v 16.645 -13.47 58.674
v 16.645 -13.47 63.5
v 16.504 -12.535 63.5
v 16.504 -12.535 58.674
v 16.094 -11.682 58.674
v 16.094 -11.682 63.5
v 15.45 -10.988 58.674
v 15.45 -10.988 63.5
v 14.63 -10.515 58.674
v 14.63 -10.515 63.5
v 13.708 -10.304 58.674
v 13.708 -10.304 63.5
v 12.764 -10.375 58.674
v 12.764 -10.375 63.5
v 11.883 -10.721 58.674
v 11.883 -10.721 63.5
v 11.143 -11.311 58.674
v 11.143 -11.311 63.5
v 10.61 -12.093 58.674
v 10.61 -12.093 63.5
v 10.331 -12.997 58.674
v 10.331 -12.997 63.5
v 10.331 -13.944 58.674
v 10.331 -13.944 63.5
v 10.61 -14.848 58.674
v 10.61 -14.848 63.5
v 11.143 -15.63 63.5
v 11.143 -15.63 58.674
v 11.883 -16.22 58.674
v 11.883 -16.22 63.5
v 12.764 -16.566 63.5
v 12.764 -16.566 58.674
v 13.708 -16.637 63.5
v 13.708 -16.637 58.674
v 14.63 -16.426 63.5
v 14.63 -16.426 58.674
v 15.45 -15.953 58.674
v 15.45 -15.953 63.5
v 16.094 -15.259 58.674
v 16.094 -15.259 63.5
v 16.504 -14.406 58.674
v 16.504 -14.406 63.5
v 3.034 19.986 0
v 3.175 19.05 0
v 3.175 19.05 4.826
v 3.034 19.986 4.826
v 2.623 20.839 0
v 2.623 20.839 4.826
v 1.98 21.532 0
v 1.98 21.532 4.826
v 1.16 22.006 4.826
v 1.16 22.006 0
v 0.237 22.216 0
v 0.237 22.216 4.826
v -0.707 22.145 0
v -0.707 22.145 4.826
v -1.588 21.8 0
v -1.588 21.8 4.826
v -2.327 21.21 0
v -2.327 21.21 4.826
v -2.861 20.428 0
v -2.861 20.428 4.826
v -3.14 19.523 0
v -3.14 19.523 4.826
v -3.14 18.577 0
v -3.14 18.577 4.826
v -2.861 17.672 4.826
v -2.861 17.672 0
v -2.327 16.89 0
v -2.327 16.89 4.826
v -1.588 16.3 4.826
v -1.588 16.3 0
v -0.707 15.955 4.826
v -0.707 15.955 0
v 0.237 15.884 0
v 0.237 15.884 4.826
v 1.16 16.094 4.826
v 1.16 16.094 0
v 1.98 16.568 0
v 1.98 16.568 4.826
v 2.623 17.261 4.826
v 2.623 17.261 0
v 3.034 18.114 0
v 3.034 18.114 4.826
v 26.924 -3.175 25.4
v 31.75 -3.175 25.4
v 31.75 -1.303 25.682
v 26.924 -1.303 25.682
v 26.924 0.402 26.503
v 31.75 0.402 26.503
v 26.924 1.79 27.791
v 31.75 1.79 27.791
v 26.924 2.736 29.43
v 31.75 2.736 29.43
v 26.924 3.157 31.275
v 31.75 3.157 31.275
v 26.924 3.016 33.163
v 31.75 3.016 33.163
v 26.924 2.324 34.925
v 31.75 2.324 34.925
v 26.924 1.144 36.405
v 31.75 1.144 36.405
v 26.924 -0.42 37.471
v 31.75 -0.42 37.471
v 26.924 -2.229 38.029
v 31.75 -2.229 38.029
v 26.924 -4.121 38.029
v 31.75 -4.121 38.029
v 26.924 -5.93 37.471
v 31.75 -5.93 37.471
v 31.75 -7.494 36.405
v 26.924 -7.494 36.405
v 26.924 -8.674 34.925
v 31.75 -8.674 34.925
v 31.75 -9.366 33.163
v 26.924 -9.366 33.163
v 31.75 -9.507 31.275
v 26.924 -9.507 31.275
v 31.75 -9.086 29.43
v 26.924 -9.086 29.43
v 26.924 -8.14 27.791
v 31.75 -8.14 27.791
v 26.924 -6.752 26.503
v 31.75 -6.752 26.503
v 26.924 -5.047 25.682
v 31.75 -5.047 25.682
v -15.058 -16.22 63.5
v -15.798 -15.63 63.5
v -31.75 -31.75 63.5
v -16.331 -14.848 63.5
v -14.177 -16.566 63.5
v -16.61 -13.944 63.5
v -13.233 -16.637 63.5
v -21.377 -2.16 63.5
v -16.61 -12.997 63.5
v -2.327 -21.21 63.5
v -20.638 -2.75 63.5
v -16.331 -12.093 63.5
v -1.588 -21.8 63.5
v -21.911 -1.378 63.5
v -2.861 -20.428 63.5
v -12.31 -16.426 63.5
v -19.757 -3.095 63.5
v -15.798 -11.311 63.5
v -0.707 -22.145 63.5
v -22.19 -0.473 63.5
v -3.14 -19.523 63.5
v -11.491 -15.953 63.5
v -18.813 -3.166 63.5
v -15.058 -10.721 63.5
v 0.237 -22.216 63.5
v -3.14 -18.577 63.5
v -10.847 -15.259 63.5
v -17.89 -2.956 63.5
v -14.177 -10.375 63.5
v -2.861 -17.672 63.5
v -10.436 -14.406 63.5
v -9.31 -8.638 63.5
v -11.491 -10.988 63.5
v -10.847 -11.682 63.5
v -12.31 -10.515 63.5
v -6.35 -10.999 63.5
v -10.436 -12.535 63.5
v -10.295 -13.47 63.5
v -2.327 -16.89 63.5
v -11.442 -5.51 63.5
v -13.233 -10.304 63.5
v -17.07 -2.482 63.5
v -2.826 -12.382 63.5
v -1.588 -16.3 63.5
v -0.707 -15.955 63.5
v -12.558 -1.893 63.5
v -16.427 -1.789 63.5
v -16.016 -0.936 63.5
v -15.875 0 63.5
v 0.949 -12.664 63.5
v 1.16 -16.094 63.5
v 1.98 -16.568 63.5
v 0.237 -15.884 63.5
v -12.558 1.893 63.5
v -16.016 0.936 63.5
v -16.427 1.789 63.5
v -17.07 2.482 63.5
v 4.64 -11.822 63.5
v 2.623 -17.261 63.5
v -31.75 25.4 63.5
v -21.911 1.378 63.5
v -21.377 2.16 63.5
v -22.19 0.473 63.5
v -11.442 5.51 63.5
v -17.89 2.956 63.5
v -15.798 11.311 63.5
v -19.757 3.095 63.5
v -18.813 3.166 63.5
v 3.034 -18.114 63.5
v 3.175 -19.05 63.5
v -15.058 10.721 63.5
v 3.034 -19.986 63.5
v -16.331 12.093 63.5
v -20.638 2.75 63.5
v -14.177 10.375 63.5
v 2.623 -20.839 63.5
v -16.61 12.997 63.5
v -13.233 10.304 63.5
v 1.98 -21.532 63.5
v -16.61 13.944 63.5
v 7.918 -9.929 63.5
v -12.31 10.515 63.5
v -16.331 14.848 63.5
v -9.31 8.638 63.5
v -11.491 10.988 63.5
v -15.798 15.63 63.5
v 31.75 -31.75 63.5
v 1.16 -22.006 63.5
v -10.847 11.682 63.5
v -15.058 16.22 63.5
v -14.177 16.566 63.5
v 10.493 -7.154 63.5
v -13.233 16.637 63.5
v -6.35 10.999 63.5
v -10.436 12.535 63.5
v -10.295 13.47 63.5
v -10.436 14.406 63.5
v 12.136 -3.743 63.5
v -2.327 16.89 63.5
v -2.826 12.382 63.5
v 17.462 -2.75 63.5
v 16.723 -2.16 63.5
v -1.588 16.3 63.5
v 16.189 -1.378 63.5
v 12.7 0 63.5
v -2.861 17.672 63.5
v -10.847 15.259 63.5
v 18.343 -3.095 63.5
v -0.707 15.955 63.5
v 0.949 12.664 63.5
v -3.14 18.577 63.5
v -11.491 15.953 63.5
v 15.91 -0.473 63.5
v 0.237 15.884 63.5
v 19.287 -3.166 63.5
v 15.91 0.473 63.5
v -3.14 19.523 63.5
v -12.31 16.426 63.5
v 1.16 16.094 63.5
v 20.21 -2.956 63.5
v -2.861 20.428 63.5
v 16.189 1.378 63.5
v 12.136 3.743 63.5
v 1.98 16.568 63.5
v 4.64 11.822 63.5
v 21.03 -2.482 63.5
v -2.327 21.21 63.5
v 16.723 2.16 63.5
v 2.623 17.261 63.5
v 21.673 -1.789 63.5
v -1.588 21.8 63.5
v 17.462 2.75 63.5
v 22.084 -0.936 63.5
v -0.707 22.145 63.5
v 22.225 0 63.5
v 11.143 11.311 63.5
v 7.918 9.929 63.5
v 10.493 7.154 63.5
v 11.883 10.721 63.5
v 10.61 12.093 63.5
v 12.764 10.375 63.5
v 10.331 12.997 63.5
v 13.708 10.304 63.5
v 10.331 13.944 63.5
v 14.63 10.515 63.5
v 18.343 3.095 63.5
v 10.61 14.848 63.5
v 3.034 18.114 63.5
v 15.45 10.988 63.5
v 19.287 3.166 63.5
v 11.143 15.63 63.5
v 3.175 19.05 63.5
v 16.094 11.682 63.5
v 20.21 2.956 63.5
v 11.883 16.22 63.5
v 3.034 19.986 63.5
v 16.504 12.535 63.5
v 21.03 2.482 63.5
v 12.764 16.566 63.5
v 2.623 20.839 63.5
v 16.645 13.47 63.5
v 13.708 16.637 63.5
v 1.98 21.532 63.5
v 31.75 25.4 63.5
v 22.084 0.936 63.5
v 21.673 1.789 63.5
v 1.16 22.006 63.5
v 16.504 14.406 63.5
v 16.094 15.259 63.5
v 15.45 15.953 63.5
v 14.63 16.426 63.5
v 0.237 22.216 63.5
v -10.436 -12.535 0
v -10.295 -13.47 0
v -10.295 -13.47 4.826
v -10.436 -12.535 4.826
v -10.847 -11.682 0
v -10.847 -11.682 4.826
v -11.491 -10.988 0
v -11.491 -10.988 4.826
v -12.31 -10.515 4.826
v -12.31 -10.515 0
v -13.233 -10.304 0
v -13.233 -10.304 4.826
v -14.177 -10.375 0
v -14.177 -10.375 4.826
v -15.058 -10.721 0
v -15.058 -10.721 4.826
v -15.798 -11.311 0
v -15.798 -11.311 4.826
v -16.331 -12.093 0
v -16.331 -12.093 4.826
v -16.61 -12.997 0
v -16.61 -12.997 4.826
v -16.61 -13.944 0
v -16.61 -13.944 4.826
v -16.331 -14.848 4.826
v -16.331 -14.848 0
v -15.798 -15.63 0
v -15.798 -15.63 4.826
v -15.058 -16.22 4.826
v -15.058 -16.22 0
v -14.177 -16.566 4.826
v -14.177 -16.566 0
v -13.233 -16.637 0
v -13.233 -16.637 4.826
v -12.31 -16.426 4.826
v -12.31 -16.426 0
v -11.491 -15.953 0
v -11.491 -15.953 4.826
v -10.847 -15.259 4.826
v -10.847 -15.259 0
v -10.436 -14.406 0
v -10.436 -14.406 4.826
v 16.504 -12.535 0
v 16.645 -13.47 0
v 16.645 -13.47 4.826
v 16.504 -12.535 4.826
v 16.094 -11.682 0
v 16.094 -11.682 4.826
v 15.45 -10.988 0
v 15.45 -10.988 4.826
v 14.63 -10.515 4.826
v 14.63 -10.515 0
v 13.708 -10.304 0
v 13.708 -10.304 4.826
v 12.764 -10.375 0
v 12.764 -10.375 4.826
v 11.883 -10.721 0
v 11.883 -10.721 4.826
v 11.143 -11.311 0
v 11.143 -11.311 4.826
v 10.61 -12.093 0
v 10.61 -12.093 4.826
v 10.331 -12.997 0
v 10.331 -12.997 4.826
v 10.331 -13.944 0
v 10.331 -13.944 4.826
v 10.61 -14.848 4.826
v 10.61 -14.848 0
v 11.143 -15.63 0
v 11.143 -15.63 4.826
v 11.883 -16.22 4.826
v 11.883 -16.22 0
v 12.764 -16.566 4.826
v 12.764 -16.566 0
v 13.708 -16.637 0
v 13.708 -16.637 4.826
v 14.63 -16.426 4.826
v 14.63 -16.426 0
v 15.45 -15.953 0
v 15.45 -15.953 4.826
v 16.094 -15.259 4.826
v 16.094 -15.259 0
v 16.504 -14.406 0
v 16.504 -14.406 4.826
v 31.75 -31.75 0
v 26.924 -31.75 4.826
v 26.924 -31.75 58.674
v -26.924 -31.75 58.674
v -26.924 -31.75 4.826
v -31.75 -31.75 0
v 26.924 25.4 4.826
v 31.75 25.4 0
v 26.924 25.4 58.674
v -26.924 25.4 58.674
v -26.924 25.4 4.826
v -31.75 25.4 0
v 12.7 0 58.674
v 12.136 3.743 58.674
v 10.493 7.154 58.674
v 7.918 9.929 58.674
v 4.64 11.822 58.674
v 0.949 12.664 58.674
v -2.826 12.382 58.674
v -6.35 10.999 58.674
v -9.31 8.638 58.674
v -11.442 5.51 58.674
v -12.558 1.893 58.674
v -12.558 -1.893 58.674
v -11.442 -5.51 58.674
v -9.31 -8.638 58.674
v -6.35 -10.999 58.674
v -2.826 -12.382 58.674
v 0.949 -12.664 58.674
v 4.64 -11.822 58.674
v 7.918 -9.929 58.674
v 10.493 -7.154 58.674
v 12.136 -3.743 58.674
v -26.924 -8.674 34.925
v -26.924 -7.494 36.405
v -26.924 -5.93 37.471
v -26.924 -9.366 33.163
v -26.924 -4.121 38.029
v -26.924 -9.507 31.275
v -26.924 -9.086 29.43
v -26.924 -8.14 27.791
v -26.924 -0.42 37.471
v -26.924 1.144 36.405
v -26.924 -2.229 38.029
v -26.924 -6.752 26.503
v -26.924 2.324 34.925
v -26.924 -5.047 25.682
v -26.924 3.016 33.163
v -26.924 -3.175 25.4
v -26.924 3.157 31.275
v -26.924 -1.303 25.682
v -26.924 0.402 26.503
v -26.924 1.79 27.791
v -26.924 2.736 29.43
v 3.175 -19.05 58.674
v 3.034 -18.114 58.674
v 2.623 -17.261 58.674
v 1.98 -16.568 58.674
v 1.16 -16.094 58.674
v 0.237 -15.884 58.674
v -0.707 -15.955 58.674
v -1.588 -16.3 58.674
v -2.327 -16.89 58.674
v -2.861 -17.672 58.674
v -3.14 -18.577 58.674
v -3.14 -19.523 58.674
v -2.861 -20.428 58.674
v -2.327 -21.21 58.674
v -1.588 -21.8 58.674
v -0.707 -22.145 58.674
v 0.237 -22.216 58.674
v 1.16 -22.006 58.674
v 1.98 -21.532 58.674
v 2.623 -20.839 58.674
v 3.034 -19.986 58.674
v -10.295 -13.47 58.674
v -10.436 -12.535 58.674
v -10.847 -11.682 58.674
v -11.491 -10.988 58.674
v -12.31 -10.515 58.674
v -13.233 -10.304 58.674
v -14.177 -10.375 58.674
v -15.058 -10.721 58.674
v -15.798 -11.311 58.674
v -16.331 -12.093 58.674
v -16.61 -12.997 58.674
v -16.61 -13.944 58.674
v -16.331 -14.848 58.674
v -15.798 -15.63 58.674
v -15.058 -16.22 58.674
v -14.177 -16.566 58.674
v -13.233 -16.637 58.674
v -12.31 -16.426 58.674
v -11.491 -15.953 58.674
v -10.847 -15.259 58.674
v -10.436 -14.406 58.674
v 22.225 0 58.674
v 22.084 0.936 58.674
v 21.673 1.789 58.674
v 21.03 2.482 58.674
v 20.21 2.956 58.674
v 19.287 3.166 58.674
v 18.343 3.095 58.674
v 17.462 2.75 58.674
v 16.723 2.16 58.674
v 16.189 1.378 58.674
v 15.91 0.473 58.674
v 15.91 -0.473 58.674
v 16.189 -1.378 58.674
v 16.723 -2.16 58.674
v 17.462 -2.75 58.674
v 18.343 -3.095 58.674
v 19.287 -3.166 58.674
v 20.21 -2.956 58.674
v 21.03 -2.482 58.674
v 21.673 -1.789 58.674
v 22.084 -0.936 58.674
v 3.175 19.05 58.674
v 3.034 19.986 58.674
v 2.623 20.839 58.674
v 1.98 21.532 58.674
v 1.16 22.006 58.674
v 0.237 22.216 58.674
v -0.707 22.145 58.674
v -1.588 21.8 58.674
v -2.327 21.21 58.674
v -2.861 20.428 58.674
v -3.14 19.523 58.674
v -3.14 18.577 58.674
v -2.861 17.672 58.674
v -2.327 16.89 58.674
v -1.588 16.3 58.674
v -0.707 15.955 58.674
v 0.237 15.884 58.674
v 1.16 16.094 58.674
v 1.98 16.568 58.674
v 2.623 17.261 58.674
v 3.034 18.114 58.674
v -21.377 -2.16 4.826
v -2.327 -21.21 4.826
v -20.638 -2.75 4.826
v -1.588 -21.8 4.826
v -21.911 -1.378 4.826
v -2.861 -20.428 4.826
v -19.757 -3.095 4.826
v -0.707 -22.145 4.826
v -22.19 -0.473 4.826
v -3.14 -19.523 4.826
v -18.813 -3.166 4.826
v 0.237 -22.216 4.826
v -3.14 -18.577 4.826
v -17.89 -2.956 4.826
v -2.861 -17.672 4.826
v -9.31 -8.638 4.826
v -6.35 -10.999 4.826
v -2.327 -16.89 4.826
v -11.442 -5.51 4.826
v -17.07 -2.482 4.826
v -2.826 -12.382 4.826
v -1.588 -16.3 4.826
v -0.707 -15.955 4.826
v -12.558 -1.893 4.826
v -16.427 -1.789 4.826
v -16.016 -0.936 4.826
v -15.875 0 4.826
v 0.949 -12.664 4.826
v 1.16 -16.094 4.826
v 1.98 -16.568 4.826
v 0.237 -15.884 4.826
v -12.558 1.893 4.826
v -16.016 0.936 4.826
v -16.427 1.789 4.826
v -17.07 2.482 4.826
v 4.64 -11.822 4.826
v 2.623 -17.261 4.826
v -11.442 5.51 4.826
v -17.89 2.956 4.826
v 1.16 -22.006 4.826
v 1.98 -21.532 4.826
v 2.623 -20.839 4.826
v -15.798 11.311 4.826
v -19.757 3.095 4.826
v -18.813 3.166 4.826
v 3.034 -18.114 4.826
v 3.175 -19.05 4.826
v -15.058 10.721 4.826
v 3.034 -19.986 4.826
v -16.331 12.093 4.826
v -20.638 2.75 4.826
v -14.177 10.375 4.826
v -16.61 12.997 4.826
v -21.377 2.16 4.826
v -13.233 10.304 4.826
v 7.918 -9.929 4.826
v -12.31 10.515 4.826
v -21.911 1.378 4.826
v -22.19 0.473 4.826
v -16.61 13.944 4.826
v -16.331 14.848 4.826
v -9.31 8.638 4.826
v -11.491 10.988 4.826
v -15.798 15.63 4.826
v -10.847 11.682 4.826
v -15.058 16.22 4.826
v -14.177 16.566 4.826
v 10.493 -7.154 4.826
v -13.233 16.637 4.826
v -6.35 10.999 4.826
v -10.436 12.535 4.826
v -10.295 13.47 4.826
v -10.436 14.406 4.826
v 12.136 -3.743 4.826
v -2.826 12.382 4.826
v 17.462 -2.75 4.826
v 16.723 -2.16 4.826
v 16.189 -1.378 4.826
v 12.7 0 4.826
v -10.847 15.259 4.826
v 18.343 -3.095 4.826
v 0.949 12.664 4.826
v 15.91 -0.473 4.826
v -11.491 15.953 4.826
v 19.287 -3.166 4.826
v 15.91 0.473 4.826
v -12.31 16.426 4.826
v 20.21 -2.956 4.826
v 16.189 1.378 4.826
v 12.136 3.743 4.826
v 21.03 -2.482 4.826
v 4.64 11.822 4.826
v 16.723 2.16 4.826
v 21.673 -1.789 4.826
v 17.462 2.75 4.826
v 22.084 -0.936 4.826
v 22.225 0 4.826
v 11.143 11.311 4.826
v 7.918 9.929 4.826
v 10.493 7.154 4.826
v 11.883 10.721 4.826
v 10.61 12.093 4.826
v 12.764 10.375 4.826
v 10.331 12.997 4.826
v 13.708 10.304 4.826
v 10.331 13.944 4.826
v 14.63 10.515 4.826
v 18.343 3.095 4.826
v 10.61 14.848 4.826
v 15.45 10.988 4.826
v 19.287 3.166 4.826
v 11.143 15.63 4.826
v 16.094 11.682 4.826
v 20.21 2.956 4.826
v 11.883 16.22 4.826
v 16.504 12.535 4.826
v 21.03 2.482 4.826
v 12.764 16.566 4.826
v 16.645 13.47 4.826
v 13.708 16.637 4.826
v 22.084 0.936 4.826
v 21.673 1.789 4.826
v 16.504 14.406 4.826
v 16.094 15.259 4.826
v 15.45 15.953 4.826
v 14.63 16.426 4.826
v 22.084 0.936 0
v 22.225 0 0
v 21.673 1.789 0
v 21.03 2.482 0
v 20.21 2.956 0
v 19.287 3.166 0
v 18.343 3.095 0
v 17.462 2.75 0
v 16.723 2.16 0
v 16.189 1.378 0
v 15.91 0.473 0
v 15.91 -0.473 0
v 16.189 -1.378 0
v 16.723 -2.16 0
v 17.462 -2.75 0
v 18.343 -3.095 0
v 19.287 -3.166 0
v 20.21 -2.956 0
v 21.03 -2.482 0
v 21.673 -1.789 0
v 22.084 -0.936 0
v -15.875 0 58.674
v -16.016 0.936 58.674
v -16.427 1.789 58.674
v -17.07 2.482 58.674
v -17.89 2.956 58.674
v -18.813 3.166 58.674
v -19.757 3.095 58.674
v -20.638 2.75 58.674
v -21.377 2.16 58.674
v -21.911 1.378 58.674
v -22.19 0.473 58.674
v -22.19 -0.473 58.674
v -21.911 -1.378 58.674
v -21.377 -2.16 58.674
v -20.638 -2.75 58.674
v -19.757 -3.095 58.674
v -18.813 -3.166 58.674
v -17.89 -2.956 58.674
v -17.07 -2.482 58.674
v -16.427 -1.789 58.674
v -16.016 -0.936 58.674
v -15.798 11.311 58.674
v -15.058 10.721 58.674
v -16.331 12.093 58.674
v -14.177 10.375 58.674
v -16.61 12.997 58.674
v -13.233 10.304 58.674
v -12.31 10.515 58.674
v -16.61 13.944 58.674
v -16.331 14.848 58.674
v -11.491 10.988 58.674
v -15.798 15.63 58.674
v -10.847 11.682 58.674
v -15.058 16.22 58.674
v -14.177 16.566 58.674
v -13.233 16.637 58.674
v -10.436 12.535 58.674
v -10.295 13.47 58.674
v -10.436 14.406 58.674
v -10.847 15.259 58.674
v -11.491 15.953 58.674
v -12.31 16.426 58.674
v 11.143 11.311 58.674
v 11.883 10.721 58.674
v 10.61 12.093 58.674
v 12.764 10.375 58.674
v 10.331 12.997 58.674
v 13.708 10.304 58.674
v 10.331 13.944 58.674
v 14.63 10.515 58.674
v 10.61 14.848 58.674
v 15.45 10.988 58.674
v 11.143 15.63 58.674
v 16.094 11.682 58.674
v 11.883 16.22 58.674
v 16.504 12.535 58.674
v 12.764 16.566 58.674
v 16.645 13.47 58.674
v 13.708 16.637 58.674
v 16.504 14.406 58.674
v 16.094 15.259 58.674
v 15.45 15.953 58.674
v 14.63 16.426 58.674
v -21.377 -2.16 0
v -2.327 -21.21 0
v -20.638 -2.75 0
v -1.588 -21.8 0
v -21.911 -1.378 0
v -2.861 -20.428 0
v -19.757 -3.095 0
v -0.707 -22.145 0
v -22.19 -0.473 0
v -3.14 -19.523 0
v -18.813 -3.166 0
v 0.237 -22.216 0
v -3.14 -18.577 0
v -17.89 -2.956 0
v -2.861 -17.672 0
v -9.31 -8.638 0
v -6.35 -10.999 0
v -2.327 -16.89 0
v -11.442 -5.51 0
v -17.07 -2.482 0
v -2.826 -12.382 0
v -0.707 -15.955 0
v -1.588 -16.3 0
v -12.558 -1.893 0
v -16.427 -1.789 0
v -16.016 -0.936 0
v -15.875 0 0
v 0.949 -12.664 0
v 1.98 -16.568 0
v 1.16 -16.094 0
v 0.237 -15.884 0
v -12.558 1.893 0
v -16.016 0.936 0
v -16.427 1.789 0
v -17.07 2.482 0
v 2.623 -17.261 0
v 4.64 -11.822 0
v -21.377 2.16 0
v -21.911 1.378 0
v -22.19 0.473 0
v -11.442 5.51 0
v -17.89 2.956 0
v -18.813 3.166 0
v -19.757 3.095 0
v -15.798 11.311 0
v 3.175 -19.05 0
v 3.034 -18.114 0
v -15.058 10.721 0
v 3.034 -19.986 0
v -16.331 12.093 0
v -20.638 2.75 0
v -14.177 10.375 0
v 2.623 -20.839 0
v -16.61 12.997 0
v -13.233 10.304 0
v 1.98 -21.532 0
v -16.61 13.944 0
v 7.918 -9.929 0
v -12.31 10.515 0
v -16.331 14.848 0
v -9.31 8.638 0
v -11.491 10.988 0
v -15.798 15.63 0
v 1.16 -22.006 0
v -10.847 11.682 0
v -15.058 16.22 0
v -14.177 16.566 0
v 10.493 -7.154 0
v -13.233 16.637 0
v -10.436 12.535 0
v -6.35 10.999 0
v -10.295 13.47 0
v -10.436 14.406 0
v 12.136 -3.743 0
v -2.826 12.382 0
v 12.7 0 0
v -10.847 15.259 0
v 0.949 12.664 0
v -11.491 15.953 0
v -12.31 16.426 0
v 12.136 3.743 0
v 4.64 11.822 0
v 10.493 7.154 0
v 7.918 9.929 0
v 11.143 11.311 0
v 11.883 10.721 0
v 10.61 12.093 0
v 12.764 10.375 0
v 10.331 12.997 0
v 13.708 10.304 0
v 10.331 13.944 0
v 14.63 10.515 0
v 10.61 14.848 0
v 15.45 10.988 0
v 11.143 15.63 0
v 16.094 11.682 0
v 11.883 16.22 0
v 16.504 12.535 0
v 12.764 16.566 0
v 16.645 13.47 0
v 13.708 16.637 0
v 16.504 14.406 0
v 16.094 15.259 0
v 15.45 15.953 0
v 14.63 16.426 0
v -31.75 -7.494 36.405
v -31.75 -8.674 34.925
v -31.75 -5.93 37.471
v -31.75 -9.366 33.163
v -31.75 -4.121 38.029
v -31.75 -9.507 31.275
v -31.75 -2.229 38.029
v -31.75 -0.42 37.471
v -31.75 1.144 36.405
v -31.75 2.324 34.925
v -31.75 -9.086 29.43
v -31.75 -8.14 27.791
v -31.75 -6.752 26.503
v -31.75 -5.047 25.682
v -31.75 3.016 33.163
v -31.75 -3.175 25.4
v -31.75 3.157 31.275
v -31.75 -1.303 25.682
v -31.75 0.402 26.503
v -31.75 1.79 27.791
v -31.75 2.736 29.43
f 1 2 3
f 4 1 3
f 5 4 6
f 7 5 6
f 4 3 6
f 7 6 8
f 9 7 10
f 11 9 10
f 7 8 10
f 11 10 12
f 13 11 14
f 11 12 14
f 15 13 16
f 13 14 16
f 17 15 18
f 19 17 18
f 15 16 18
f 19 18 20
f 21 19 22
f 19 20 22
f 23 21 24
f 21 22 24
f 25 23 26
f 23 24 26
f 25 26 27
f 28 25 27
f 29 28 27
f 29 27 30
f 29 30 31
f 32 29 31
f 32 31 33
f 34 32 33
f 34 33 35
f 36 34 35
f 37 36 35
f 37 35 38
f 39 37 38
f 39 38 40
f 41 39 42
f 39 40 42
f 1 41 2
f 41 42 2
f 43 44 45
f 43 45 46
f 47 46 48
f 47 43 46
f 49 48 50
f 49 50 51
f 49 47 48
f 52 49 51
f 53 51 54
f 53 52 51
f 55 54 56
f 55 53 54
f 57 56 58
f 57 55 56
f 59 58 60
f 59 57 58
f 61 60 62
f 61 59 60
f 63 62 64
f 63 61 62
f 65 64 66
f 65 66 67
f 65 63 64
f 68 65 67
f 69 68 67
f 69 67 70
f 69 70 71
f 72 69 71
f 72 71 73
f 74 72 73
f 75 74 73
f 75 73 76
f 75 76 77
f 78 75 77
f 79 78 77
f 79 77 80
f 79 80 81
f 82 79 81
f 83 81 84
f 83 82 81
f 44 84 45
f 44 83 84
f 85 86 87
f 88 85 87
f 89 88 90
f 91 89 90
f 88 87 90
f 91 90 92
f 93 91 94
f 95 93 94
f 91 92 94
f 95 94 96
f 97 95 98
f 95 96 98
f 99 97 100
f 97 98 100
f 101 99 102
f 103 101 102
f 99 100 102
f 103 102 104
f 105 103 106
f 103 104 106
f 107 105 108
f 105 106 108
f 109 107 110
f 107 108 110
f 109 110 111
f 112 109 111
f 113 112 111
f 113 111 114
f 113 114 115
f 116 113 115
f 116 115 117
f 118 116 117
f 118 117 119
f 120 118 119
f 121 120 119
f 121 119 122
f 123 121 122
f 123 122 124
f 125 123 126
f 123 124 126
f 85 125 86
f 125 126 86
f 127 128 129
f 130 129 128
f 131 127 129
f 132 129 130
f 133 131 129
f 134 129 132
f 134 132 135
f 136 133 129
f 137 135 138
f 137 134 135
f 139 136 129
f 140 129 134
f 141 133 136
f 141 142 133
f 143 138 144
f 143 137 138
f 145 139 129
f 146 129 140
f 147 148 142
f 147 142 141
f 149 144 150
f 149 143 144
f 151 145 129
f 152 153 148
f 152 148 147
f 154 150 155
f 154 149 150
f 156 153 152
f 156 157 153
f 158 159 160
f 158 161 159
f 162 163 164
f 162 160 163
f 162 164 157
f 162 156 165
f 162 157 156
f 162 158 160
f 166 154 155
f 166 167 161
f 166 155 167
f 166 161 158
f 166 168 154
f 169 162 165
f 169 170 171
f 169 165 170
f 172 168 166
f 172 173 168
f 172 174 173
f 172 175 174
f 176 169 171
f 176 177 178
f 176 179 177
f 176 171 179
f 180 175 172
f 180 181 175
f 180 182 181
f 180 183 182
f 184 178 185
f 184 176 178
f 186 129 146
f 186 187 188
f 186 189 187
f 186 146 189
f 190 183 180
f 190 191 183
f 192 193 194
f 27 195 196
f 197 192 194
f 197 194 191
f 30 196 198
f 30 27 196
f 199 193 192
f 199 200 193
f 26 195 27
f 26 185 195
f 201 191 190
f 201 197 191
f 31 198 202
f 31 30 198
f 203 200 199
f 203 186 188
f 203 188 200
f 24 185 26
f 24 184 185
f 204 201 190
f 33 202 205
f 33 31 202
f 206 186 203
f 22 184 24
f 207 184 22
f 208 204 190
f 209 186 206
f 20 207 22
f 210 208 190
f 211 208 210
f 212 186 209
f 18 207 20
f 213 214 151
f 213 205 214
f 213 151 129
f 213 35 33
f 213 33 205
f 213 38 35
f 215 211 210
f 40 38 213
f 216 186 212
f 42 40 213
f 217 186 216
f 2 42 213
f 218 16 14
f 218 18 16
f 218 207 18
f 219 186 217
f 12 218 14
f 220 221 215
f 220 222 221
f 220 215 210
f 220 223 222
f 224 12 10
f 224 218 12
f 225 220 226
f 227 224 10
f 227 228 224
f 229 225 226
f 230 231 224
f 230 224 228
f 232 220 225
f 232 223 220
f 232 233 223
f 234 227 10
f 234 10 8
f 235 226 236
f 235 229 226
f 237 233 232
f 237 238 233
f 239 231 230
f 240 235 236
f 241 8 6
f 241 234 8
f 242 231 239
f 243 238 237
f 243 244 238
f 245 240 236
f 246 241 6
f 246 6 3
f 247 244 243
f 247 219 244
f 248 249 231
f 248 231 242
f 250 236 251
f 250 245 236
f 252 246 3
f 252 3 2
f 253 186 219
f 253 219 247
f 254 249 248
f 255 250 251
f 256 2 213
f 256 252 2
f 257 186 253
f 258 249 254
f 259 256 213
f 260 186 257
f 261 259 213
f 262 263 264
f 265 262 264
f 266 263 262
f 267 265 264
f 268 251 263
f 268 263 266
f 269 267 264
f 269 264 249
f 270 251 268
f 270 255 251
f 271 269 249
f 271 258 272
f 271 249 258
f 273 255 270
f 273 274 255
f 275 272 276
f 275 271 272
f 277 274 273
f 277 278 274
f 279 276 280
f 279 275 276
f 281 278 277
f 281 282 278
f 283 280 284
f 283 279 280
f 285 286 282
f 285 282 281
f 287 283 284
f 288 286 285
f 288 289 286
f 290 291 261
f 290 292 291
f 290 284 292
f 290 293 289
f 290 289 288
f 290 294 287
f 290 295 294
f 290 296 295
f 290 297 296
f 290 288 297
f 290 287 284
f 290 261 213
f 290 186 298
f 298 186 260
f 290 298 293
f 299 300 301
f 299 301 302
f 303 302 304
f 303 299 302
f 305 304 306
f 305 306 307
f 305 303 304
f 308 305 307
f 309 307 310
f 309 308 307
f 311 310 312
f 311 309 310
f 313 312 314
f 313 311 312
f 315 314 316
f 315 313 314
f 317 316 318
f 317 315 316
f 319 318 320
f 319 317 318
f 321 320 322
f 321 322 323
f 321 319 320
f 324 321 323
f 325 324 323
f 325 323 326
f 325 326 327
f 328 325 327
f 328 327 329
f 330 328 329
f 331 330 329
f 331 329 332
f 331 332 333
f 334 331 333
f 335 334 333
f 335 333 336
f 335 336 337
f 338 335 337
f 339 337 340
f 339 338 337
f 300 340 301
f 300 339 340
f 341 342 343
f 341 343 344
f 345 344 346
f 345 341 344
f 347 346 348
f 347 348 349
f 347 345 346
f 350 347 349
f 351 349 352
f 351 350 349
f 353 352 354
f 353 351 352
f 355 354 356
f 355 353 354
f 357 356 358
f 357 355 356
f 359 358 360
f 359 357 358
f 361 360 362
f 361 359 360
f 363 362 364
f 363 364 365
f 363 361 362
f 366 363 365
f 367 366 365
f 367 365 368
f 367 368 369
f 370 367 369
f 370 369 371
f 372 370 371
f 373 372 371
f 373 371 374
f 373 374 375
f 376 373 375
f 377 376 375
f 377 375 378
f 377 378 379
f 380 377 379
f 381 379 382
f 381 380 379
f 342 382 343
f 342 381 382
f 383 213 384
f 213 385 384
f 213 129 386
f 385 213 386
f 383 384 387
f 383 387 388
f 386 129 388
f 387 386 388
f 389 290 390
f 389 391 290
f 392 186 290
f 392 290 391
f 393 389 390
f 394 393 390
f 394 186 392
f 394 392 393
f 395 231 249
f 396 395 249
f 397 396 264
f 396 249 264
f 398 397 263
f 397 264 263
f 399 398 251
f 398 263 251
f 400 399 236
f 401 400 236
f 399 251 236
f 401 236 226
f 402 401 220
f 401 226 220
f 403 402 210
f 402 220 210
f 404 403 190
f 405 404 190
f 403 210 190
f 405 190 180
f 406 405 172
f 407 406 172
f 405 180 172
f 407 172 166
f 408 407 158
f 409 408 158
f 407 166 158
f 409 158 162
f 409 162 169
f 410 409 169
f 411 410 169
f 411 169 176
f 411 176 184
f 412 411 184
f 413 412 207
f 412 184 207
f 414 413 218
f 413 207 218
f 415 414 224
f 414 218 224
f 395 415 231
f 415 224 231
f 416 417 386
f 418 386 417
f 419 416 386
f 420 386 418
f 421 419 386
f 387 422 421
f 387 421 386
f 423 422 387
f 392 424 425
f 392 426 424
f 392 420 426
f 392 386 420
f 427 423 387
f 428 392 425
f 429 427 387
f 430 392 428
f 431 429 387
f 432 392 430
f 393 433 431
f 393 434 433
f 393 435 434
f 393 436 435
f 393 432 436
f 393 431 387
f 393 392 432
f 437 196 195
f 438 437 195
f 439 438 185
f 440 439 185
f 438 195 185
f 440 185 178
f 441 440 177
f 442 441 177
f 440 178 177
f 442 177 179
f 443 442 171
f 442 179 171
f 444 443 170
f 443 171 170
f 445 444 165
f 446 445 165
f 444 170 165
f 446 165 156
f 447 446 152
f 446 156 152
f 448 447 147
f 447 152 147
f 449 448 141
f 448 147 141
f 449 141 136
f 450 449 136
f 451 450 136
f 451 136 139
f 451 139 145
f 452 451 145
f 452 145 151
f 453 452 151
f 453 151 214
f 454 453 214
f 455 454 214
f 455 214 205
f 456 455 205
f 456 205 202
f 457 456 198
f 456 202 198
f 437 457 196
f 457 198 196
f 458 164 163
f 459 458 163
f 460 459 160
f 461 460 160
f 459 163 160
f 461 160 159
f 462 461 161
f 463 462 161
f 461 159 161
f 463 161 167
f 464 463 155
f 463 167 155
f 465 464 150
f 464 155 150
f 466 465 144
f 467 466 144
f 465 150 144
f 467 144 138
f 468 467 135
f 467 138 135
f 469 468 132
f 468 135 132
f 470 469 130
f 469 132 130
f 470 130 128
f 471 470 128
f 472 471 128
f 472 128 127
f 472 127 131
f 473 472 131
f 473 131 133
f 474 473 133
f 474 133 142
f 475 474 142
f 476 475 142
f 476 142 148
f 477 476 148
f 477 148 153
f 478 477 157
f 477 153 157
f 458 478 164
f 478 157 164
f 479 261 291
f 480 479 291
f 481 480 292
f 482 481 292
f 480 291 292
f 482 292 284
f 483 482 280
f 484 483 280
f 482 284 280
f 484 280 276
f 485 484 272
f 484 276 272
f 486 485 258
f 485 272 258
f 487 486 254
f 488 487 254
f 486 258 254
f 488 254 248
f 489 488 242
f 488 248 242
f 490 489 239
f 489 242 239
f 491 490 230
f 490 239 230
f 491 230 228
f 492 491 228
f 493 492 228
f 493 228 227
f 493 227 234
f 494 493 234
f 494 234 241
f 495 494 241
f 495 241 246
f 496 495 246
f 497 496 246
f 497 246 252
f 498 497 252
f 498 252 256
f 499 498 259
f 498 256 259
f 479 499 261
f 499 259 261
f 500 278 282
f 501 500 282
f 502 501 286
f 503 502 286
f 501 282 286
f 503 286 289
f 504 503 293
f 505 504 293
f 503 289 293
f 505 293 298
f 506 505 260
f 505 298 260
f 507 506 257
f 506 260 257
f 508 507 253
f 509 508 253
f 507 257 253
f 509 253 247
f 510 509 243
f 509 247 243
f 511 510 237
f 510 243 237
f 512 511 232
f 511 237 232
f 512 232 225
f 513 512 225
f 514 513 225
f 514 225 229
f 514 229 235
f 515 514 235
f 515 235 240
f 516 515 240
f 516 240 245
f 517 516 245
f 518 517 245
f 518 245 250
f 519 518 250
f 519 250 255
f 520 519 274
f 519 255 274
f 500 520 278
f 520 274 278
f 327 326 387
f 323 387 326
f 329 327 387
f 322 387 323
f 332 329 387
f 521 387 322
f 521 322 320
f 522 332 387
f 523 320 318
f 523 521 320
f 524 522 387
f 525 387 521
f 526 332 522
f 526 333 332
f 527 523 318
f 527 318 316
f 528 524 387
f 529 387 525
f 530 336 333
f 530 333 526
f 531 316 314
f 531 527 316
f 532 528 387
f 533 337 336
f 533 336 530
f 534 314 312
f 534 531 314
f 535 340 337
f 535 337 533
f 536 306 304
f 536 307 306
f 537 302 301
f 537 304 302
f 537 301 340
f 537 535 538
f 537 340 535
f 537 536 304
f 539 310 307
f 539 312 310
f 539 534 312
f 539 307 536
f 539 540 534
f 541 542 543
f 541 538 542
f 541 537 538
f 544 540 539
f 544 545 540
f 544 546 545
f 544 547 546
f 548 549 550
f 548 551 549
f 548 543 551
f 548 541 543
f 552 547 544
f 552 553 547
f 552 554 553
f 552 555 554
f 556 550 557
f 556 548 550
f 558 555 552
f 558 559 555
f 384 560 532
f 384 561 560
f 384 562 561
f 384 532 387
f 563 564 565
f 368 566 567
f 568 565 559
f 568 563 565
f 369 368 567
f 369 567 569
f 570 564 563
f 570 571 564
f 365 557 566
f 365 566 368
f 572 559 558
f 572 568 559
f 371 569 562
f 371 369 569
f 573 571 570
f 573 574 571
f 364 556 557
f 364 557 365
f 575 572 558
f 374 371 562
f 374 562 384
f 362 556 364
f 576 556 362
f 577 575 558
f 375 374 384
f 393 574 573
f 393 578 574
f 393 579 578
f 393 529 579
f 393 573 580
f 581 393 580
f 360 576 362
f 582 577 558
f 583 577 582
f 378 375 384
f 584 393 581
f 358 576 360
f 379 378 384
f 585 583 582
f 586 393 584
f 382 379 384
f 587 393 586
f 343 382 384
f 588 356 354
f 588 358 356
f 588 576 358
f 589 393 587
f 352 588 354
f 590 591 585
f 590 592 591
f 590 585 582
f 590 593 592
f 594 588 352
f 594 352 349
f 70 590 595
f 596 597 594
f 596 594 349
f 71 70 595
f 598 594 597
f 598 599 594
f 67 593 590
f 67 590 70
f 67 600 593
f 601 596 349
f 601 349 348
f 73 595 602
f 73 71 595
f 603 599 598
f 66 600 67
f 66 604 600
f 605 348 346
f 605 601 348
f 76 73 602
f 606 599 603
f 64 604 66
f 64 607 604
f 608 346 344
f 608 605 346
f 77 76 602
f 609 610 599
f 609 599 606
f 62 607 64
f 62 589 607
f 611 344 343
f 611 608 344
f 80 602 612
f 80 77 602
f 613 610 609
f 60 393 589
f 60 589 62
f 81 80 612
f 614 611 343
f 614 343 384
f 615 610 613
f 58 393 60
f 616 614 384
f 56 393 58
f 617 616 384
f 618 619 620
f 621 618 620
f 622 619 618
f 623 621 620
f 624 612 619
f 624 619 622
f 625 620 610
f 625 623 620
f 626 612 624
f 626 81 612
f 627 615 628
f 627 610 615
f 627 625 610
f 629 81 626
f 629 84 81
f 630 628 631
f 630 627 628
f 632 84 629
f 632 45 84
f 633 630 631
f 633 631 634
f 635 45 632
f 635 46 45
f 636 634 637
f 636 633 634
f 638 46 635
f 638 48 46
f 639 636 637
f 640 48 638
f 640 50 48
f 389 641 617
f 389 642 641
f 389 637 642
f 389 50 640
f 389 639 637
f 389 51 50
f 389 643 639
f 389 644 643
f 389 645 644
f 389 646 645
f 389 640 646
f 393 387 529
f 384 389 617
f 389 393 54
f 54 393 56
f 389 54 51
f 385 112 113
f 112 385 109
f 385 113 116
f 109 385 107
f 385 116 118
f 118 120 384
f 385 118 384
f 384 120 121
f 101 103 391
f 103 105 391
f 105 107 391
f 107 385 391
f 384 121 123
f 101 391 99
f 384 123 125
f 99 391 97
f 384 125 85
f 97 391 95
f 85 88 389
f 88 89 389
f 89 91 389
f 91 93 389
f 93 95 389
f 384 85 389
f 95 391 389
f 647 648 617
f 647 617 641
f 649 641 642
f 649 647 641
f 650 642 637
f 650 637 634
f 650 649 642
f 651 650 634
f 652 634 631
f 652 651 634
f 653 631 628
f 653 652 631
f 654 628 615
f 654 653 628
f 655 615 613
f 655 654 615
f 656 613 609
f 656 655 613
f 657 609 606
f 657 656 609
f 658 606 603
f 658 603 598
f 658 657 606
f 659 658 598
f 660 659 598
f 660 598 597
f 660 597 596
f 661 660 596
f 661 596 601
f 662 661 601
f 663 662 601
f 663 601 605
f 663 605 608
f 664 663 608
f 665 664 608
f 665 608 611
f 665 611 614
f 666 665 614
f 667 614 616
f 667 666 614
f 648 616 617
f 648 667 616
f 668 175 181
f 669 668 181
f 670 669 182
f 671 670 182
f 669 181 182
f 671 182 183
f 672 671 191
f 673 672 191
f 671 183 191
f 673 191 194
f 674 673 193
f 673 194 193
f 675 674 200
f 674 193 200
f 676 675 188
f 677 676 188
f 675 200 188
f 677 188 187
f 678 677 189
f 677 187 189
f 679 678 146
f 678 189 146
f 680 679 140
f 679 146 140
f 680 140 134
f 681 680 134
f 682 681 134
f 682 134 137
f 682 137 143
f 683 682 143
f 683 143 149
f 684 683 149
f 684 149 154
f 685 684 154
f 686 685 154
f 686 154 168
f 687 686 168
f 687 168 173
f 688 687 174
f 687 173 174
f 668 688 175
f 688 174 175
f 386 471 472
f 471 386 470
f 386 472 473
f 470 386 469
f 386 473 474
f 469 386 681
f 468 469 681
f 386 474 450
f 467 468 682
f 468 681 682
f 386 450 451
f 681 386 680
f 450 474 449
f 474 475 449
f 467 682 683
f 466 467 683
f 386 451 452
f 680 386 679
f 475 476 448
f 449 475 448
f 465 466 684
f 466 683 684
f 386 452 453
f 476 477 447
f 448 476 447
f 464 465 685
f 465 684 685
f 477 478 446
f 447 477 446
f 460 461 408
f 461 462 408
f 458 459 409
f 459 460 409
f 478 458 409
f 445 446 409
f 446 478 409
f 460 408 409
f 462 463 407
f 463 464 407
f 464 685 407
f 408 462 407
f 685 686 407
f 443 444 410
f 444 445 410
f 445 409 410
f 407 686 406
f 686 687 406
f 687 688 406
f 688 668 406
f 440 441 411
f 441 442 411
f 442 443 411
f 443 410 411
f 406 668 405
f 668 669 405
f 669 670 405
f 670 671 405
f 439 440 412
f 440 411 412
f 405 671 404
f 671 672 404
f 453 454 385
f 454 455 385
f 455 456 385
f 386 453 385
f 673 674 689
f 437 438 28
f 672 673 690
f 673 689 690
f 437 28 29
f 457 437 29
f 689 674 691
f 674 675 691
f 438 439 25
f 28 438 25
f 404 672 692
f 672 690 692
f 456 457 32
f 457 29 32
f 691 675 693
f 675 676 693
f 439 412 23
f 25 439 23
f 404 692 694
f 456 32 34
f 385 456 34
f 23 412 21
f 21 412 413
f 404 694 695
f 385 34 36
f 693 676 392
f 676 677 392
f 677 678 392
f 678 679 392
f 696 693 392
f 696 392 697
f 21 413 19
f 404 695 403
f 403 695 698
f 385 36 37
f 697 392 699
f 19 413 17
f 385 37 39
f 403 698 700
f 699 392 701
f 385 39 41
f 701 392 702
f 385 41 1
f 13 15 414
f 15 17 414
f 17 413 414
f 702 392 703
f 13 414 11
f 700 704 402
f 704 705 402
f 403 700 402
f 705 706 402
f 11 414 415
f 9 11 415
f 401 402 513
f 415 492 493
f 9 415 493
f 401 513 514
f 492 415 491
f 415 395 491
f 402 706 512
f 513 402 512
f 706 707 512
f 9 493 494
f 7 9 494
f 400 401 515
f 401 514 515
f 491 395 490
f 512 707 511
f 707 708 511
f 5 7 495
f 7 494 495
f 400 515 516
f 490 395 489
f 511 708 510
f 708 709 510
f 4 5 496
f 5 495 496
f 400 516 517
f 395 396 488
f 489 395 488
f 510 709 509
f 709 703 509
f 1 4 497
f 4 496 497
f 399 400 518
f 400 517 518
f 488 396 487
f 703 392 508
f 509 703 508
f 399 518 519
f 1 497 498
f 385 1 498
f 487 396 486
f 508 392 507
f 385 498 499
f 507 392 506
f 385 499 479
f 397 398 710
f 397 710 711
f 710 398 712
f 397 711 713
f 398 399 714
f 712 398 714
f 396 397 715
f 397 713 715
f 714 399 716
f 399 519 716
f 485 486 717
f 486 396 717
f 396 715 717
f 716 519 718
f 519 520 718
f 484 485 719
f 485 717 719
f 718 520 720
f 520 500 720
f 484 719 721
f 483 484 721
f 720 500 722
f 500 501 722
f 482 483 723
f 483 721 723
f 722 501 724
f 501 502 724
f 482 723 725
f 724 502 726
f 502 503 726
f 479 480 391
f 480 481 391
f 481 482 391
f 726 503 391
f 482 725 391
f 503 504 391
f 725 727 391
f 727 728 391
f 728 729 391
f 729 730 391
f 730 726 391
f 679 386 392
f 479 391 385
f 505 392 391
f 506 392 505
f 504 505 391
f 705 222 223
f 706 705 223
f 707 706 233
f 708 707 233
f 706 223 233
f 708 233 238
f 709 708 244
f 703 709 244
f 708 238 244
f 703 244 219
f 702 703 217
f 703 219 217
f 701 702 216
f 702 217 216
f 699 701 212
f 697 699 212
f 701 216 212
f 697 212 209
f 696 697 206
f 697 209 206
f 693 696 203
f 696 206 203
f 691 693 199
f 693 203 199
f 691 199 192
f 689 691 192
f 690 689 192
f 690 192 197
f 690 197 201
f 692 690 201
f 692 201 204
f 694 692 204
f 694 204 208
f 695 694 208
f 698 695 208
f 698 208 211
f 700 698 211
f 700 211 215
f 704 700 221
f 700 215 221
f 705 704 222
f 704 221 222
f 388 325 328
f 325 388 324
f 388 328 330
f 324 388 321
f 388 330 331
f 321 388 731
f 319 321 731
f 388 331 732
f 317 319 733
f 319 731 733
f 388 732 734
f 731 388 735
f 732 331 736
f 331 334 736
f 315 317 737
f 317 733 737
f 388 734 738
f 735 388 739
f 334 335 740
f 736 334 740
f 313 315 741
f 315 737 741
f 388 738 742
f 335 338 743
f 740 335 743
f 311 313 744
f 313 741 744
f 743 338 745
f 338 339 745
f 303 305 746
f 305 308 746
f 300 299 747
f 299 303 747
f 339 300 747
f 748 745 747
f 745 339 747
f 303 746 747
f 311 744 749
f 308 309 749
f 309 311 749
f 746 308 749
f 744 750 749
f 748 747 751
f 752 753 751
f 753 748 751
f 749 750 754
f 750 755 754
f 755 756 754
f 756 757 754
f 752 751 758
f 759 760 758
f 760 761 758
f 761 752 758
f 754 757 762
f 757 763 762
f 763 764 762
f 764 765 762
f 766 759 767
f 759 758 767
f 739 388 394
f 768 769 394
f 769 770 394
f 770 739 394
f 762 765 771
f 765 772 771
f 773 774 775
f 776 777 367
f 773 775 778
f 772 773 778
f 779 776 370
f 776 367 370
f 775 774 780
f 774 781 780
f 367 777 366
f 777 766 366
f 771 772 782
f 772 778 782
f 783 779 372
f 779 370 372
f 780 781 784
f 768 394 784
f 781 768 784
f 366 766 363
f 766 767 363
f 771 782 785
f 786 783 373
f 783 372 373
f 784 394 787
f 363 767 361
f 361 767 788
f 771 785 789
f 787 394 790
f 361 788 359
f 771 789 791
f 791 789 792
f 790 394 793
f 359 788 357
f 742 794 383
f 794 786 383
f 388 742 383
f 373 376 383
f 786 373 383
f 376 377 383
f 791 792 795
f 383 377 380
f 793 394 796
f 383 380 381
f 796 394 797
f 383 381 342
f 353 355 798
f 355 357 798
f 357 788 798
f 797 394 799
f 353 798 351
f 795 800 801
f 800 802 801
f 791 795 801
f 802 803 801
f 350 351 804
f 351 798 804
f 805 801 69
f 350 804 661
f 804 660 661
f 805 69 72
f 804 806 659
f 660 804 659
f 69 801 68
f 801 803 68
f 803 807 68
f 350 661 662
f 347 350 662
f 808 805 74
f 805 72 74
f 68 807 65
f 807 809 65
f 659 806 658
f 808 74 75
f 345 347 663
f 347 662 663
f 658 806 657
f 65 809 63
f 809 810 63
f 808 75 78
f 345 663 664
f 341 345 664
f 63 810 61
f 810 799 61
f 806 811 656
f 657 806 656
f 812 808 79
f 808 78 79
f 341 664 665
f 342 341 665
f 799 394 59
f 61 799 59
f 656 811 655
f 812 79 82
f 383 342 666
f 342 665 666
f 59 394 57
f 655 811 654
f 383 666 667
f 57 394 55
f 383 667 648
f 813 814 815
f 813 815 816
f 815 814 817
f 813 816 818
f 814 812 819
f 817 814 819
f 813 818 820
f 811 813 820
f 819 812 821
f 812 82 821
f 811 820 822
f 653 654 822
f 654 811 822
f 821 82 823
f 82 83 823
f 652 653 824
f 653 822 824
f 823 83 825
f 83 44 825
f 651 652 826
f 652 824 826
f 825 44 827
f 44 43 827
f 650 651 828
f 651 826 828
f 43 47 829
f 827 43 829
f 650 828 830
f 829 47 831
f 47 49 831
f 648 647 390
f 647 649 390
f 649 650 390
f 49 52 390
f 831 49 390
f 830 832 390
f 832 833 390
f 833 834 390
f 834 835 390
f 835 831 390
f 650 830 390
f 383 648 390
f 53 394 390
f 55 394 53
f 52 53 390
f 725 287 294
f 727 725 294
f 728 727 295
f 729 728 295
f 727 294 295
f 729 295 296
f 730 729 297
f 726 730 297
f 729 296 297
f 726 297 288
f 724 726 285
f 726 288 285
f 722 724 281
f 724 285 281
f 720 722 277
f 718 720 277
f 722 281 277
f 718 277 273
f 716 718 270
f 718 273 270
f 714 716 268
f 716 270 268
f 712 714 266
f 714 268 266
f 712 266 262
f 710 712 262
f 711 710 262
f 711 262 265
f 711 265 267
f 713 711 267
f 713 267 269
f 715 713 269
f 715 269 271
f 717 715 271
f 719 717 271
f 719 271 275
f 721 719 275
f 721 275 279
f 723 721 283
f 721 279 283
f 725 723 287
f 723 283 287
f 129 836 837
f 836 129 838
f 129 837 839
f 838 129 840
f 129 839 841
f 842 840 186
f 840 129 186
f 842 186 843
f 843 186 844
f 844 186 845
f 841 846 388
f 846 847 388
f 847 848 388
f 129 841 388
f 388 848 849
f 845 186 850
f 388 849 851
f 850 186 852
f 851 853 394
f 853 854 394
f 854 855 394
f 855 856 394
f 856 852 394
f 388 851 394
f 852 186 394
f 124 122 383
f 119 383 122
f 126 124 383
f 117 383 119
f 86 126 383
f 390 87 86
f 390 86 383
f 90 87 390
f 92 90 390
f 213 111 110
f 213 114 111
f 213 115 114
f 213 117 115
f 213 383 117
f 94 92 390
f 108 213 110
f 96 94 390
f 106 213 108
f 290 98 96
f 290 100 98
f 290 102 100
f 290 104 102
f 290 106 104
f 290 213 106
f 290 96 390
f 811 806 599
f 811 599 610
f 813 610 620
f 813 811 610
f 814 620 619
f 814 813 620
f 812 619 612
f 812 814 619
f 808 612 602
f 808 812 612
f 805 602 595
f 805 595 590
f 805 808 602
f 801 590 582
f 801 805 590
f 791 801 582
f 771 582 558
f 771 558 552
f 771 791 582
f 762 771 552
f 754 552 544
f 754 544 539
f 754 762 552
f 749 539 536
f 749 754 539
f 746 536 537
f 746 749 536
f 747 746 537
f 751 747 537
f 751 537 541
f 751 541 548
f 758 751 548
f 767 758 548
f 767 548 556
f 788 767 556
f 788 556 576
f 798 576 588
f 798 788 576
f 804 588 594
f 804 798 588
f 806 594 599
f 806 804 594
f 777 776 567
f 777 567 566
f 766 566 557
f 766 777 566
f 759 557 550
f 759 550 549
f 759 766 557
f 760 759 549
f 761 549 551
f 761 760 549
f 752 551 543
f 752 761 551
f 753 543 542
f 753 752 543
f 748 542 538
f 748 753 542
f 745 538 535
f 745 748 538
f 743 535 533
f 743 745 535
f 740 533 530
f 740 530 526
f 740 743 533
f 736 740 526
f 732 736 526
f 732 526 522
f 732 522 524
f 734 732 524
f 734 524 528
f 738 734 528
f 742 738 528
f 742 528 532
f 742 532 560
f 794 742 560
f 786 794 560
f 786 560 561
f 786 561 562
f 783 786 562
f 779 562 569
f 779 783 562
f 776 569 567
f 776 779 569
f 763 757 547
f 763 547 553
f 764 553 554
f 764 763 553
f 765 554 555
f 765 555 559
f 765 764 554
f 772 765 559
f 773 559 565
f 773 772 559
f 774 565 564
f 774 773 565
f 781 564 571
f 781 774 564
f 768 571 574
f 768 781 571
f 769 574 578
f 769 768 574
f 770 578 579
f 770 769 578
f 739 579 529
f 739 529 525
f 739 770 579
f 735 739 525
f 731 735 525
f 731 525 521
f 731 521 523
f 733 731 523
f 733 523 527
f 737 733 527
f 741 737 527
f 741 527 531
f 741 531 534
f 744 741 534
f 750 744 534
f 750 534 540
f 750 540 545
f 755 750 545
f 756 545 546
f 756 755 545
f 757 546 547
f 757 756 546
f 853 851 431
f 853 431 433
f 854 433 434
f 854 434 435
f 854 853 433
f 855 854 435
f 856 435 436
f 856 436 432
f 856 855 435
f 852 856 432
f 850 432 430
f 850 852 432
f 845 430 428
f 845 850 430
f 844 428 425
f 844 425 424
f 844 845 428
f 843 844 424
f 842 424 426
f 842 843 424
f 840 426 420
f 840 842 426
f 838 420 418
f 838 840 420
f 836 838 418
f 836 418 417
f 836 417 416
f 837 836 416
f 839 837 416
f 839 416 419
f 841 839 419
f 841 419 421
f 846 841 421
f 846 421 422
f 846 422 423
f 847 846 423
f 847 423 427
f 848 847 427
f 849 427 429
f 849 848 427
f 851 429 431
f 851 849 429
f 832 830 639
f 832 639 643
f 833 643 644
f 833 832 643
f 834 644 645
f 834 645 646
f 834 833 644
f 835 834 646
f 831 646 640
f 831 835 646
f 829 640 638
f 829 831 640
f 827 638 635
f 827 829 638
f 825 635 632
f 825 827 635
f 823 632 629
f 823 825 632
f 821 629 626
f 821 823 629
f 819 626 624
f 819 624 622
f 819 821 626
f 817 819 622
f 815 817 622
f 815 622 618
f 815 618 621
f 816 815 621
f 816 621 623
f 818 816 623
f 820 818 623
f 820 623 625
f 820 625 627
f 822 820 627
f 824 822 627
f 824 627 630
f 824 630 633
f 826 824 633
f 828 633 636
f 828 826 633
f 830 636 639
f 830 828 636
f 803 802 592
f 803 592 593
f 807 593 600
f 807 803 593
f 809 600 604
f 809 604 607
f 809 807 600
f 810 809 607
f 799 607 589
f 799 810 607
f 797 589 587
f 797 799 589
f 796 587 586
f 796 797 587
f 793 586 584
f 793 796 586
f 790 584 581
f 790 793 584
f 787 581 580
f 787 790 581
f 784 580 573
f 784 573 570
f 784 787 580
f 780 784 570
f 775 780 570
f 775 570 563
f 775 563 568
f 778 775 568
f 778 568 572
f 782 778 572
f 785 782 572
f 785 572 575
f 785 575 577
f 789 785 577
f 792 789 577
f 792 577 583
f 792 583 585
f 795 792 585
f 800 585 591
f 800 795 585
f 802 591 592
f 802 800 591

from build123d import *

# Parameters (mm, degrees)
SKETCH1_W           = 63.5
SKETCH1_H           = 57.15
SKETCH1_R           = 12.7
SKETCH1_R_2         = 3.175
BOSS_EXTRUDE2_DEPTH = 4.826
SKETCH2_W           = 53.848
SKETCH2_H           = 57.15
SKETCH2_R           = 6.35
BOSS_EXTRUDE3_DEPTH = 4.826


with BuildPart() as part:
    # Sketch1 → Boss-Extrude2 (new body)
    with BuildSketch(Plane.XY):
        with Locations((0, -3.175)):
            Rectangle(SKETCH1_W, SKETCH1_H)
        Circle(SKETCH1_R, mode=Mode.SUBTRACT)
        with Locations((0, 19.05)):
            Circle(SKETCH1_R_2, mode=Mode.SUBTRACT)
        with Locations((13.470384182, 13.470384182)):
            Circle(SKETCH1_R_2, mode=Mode.SUBTRACT)
        with Locations((19.05, 0)):
            Circle(SKETCH1_R_2, mode=Mode.SUBTRACT)
        with Locations((13.470384182, -13.470384182)):
            Circle(SKETCH1_R_2, mode=Mode.SUBTRACT)
        with Locations((0, -19.05)):
            Circle(SKETCH1_R_2, mode=Mode.SUBTRACT)
        with Locations((-13.470384182, -13.470384182)):
            Circle(SKETCH1_R_2, mode=Mode.SUBTRACT)
        with Locations((-19.05, 0)):
            Circle(SKETCH1_R_2, mode=Mode.SUBTRACT)
        with Locations((-13.470384182, 13.470384182)):
            Circle(SKETCH1_R_2, mode=Mode.SUBTRACT)
    boss_extrude2 = extrude(amount=BOSS_EXTRUDE2_DEPTH)

    # Sketch2 → Boss-Extrude3 (add)
    with BuildSketch(Plane(origin=(31.75, 0, 0), x_dir=(0, 0, -1), z_dir=(1, 0, 0))):
        with Locations((-31.75, -3.175)):
            Rectangle(SKETCH2_W, SKETCH2_H)
        with Locations((-31.75, -3.175)):
            Circle(SKETCH2_R, mode=Mode.SUBTRACT)
    boss_extrude3 = extrude(amount=-BOSS_EXTRUDE3_DEPTH)

    # Mirror1: Boss-Extrude2 across plane
    add(boss_extrude2.mirror(Plane.XY.offset(31.75)))

    # Mirror3: Boss-Extrude3 across plane
    add(boss_extrude3.mirror(Plane.ZY))


solid = part.part
